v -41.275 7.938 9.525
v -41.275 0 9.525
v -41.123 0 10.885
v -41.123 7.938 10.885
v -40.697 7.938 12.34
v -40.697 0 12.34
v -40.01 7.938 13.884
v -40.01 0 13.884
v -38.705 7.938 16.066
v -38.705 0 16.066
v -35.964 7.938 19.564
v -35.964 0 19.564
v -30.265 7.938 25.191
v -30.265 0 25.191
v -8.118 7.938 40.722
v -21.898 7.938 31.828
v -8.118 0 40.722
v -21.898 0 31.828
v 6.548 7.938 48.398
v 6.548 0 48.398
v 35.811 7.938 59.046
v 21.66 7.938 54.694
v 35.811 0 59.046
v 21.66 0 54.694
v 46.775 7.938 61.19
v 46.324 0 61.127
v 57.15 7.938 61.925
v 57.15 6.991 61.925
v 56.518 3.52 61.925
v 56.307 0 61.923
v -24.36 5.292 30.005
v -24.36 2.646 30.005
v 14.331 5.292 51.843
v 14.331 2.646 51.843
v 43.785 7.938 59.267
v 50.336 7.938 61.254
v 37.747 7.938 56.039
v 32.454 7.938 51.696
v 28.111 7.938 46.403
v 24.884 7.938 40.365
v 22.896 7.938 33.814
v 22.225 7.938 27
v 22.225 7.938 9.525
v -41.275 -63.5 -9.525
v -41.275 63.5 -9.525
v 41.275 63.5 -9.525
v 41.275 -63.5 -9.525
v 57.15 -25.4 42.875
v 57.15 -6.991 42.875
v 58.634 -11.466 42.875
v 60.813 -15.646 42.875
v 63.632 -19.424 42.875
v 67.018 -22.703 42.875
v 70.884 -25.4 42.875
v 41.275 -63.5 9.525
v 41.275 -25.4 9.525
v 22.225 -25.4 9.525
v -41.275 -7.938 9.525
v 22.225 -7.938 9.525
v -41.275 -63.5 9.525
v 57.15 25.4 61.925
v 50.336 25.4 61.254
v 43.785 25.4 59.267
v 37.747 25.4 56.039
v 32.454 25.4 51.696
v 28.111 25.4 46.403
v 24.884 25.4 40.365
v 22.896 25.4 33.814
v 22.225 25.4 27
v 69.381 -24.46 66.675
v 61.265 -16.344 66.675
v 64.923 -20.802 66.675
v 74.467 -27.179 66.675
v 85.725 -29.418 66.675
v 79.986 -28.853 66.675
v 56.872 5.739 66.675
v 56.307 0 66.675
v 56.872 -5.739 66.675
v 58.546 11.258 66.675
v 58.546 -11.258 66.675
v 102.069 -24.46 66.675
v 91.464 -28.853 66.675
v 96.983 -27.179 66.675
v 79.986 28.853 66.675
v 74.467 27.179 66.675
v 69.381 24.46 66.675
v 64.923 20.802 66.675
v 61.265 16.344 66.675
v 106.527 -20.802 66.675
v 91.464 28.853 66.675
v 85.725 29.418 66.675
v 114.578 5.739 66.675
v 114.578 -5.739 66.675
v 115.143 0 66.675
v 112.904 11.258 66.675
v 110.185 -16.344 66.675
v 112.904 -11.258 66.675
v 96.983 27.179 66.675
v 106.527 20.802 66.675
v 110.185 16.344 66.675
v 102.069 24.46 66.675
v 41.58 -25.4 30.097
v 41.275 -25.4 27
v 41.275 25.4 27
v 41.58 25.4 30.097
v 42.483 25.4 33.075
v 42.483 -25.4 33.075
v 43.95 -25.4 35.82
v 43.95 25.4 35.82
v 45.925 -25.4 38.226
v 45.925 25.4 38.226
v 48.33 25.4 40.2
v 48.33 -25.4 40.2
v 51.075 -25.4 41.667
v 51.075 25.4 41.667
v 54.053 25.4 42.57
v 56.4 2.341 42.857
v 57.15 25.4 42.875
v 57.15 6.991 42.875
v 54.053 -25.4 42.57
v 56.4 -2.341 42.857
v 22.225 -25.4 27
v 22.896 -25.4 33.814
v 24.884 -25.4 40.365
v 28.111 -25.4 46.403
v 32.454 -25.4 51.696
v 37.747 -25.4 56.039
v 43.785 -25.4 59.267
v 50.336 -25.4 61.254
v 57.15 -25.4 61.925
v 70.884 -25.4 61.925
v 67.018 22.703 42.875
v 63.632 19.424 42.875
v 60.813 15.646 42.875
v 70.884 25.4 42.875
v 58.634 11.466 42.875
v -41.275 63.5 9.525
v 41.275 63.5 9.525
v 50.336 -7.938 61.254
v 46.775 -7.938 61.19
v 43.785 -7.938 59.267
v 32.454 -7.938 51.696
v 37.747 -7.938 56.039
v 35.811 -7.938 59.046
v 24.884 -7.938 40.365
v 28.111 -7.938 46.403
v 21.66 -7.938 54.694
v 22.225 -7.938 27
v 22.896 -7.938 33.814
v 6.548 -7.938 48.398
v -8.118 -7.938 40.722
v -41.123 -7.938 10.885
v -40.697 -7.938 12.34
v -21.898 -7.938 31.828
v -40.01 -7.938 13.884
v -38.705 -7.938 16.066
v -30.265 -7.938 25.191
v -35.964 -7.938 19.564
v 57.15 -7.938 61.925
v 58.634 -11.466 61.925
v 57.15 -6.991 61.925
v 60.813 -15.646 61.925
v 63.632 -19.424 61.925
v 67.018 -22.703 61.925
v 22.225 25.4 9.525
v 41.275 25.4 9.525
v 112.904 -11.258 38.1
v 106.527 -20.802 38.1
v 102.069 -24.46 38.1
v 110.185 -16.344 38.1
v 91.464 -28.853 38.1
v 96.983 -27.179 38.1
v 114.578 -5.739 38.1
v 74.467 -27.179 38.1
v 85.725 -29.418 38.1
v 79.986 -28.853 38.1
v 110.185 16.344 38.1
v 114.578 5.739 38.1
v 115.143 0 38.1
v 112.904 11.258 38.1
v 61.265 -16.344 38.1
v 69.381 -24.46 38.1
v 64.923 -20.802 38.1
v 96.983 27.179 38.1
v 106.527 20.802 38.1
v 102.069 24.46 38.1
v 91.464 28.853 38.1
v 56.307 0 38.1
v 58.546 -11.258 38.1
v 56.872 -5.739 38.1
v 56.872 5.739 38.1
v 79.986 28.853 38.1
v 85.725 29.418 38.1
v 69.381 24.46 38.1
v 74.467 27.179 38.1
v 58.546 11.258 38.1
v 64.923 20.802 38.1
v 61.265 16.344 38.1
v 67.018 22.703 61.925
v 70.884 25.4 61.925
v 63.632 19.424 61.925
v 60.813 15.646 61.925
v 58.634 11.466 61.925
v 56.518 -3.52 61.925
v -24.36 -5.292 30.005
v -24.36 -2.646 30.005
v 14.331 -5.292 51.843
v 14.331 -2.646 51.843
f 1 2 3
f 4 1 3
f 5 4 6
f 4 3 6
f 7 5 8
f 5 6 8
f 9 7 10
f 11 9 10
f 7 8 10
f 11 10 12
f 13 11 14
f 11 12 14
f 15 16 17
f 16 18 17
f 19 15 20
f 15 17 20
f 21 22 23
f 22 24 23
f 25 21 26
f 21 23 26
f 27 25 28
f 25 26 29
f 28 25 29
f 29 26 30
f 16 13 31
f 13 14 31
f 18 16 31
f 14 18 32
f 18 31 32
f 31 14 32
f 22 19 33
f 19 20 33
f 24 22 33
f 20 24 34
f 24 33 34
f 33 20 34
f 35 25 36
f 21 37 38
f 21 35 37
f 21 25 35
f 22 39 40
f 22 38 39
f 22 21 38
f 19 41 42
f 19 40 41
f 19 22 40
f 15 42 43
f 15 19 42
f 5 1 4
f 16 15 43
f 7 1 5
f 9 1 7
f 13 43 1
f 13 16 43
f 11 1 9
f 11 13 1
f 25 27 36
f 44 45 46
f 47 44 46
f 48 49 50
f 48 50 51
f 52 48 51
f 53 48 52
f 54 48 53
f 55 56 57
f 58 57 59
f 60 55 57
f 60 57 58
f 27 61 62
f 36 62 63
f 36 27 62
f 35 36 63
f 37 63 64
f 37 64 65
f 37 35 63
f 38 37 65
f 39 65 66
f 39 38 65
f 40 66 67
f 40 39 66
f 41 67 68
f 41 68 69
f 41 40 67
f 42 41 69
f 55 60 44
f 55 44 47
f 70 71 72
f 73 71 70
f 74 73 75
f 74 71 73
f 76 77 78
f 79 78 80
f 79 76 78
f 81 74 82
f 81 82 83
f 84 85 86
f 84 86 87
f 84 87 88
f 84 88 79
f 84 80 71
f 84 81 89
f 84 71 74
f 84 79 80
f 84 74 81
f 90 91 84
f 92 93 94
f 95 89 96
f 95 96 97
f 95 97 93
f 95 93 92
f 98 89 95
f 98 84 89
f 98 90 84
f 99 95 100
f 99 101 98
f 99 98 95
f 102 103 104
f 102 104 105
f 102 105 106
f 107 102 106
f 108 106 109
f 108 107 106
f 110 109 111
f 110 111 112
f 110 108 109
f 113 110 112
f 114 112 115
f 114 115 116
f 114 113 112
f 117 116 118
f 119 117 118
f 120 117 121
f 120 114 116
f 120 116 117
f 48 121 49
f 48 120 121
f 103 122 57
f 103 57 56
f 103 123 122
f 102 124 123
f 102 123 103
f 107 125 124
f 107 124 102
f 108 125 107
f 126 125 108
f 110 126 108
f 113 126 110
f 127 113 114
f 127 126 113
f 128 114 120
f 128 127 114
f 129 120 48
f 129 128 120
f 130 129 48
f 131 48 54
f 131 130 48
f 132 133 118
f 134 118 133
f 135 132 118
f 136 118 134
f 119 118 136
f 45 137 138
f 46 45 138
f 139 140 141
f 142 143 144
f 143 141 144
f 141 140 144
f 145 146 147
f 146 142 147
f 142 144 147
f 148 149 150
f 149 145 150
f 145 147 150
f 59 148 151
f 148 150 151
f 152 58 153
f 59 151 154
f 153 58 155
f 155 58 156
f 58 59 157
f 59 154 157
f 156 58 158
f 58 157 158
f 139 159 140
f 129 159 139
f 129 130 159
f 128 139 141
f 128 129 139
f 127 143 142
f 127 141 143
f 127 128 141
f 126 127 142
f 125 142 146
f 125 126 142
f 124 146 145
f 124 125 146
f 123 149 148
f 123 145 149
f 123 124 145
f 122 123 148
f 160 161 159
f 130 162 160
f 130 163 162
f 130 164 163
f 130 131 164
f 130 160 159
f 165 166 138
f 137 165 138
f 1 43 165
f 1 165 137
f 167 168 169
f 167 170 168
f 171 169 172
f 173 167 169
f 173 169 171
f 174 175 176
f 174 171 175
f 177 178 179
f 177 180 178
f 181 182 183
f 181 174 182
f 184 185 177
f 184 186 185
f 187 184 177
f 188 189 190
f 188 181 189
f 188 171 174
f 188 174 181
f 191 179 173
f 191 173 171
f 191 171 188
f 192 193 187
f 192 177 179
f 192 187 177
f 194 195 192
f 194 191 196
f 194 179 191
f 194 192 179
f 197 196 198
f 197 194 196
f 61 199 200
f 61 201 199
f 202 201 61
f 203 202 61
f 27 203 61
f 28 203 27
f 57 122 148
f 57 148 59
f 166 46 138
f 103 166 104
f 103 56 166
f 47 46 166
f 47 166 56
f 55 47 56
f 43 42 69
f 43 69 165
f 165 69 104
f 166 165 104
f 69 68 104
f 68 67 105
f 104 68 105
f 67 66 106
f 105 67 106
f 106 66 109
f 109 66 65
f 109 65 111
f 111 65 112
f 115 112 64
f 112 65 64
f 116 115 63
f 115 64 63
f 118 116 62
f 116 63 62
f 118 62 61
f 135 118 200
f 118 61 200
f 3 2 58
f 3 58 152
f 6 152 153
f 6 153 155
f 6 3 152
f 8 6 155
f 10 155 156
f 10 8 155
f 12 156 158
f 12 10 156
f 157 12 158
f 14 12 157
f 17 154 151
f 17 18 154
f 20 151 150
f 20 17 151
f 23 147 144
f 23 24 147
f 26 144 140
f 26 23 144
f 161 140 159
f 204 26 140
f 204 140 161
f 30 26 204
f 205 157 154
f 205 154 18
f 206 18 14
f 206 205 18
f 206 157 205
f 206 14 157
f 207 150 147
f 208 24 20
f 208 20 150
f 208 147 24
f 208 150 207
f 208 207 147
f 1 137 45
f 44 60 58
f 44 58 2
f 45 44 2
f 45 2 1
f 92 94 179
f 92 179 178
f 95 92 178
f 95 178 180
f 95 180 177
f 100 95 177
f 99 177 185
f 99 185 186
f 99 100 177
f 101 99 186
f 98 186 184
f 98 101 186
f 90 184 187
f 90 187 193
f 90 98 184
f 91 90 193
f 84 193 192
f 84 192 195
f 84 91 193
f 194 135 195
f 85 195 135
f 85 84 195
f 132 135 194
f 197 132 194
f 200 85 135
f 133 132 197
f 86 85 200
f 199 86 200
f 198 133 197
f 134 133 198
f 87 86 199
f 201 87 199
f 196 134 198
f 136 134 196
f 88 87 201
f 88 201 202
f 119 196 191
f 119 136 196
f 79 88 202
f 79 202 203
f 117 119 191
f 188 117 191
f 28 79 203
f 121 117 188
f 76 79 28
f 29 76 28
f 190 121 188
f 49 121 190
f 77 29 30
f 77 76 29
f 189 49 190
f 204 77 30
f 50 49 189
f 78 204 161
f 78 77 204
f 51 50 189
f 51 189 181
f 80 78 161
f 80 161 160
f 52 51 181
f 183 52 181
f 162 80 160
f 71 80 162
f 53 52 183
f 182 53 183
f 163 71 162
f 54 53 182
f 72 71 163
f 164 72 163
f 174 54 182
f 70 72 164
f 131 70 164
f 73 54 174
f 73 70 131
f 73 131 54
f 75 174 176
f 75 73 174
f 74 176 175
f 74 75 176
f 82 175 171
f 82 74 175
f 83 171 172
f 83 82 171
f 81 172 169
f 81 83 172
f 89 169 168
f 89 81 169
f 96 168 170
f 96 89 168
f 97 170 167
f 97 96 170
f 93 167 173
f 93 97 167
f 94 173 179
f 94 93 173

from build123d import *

# Parameters (mm, degrees)
F1_DEPTH = 63.5
F0_W     = 21.3821388448
F0_H     = 19.05
F2_DEPTH = 25.4
F3_DEPTH = 7.9375


with BuildPart() as f1:
    # F0 (on Front) → F1 (new body, symmetric)
    with BuildSketch(Plane.XZ):
        Polygon((-41.275, 9.525), (-41.275, -9.525), (41.275, -9.525), (41.275, 9.525), (22.225, 9.525), align=None)
    extrude(amount=F1_DEPTH, both=True)

    # F0 (on Front) → F2 (join, symmetric)
    with BuildSketch(Plane.XZ):
        with BuildLine():
            Line((22.225, 9.525), (41.275, 9.525))
            Line((41.275, 9.525), (41.275, 27.0002))
            ThreePointArc((41.275, 27.0002), (45.9246798487, 38.2255201513), (57.15, 42.8752))
            Line((57.15, 42.8752), (64.3428611552, 42.8752))
            Line((64.3428611552, 42.8752), (64.3428611552, 61.9252))
            Line((64.3428611552, 61.9252), (57.15, 61.9252))
            ThreePointArc((57.15, 61.9252), (32.4542956671, 51.6959043329), (22.225, 27.0002))
            Line((22.225, 27.0002), (22.225, 9.525))
        make_face()
        with Locations((75.0339305776, 52.4002)):
            Rectangle(F0_W, F0_H)
    extrude(amount=F2_DEPTH, both=True)

    # F0 (on Front) → F3 (join, symmetric)
    with BuildSketch(Plane.XZ):
        with BuildLine():
            add(Edge.make_bspline(
                [(-41.275, 9.525), (-41.1300323904, 24.9551124871), (18.149998039, 62.0910935104), (57.15, 61.9252)],
                knots=[0, 0, 0, 0, 111.5045361635, 111.5045361635, 111.5045361635, 111.5045361635], degree=3))
            Line((-41.275, 9.525), (22.225, 9.525))
            Line((22.225, 9.525), (22.225, 27.0002))
            ThreePointArc((22.225, 27.0002), (32.4542956671, 51.6959043329), (57.15, 61.9252))
        make_face()
    extrude(amount=F3_DEPTH, both=True)

    # F0 (on Front) → F4 (revolve)
    with BuildSketch(Plane.XZ):
        Polygon((85.725, 66.675), (85.725, 61.9252), (85.725, 42.8752), (85.725, 38.1), (115.1428611552, 38.1), (115.1428611552, 66.675), align=None)
    revolve(axis=Axis((85.725, 0, 52.3875), (0, 0, 1)))


solid = f1.part
